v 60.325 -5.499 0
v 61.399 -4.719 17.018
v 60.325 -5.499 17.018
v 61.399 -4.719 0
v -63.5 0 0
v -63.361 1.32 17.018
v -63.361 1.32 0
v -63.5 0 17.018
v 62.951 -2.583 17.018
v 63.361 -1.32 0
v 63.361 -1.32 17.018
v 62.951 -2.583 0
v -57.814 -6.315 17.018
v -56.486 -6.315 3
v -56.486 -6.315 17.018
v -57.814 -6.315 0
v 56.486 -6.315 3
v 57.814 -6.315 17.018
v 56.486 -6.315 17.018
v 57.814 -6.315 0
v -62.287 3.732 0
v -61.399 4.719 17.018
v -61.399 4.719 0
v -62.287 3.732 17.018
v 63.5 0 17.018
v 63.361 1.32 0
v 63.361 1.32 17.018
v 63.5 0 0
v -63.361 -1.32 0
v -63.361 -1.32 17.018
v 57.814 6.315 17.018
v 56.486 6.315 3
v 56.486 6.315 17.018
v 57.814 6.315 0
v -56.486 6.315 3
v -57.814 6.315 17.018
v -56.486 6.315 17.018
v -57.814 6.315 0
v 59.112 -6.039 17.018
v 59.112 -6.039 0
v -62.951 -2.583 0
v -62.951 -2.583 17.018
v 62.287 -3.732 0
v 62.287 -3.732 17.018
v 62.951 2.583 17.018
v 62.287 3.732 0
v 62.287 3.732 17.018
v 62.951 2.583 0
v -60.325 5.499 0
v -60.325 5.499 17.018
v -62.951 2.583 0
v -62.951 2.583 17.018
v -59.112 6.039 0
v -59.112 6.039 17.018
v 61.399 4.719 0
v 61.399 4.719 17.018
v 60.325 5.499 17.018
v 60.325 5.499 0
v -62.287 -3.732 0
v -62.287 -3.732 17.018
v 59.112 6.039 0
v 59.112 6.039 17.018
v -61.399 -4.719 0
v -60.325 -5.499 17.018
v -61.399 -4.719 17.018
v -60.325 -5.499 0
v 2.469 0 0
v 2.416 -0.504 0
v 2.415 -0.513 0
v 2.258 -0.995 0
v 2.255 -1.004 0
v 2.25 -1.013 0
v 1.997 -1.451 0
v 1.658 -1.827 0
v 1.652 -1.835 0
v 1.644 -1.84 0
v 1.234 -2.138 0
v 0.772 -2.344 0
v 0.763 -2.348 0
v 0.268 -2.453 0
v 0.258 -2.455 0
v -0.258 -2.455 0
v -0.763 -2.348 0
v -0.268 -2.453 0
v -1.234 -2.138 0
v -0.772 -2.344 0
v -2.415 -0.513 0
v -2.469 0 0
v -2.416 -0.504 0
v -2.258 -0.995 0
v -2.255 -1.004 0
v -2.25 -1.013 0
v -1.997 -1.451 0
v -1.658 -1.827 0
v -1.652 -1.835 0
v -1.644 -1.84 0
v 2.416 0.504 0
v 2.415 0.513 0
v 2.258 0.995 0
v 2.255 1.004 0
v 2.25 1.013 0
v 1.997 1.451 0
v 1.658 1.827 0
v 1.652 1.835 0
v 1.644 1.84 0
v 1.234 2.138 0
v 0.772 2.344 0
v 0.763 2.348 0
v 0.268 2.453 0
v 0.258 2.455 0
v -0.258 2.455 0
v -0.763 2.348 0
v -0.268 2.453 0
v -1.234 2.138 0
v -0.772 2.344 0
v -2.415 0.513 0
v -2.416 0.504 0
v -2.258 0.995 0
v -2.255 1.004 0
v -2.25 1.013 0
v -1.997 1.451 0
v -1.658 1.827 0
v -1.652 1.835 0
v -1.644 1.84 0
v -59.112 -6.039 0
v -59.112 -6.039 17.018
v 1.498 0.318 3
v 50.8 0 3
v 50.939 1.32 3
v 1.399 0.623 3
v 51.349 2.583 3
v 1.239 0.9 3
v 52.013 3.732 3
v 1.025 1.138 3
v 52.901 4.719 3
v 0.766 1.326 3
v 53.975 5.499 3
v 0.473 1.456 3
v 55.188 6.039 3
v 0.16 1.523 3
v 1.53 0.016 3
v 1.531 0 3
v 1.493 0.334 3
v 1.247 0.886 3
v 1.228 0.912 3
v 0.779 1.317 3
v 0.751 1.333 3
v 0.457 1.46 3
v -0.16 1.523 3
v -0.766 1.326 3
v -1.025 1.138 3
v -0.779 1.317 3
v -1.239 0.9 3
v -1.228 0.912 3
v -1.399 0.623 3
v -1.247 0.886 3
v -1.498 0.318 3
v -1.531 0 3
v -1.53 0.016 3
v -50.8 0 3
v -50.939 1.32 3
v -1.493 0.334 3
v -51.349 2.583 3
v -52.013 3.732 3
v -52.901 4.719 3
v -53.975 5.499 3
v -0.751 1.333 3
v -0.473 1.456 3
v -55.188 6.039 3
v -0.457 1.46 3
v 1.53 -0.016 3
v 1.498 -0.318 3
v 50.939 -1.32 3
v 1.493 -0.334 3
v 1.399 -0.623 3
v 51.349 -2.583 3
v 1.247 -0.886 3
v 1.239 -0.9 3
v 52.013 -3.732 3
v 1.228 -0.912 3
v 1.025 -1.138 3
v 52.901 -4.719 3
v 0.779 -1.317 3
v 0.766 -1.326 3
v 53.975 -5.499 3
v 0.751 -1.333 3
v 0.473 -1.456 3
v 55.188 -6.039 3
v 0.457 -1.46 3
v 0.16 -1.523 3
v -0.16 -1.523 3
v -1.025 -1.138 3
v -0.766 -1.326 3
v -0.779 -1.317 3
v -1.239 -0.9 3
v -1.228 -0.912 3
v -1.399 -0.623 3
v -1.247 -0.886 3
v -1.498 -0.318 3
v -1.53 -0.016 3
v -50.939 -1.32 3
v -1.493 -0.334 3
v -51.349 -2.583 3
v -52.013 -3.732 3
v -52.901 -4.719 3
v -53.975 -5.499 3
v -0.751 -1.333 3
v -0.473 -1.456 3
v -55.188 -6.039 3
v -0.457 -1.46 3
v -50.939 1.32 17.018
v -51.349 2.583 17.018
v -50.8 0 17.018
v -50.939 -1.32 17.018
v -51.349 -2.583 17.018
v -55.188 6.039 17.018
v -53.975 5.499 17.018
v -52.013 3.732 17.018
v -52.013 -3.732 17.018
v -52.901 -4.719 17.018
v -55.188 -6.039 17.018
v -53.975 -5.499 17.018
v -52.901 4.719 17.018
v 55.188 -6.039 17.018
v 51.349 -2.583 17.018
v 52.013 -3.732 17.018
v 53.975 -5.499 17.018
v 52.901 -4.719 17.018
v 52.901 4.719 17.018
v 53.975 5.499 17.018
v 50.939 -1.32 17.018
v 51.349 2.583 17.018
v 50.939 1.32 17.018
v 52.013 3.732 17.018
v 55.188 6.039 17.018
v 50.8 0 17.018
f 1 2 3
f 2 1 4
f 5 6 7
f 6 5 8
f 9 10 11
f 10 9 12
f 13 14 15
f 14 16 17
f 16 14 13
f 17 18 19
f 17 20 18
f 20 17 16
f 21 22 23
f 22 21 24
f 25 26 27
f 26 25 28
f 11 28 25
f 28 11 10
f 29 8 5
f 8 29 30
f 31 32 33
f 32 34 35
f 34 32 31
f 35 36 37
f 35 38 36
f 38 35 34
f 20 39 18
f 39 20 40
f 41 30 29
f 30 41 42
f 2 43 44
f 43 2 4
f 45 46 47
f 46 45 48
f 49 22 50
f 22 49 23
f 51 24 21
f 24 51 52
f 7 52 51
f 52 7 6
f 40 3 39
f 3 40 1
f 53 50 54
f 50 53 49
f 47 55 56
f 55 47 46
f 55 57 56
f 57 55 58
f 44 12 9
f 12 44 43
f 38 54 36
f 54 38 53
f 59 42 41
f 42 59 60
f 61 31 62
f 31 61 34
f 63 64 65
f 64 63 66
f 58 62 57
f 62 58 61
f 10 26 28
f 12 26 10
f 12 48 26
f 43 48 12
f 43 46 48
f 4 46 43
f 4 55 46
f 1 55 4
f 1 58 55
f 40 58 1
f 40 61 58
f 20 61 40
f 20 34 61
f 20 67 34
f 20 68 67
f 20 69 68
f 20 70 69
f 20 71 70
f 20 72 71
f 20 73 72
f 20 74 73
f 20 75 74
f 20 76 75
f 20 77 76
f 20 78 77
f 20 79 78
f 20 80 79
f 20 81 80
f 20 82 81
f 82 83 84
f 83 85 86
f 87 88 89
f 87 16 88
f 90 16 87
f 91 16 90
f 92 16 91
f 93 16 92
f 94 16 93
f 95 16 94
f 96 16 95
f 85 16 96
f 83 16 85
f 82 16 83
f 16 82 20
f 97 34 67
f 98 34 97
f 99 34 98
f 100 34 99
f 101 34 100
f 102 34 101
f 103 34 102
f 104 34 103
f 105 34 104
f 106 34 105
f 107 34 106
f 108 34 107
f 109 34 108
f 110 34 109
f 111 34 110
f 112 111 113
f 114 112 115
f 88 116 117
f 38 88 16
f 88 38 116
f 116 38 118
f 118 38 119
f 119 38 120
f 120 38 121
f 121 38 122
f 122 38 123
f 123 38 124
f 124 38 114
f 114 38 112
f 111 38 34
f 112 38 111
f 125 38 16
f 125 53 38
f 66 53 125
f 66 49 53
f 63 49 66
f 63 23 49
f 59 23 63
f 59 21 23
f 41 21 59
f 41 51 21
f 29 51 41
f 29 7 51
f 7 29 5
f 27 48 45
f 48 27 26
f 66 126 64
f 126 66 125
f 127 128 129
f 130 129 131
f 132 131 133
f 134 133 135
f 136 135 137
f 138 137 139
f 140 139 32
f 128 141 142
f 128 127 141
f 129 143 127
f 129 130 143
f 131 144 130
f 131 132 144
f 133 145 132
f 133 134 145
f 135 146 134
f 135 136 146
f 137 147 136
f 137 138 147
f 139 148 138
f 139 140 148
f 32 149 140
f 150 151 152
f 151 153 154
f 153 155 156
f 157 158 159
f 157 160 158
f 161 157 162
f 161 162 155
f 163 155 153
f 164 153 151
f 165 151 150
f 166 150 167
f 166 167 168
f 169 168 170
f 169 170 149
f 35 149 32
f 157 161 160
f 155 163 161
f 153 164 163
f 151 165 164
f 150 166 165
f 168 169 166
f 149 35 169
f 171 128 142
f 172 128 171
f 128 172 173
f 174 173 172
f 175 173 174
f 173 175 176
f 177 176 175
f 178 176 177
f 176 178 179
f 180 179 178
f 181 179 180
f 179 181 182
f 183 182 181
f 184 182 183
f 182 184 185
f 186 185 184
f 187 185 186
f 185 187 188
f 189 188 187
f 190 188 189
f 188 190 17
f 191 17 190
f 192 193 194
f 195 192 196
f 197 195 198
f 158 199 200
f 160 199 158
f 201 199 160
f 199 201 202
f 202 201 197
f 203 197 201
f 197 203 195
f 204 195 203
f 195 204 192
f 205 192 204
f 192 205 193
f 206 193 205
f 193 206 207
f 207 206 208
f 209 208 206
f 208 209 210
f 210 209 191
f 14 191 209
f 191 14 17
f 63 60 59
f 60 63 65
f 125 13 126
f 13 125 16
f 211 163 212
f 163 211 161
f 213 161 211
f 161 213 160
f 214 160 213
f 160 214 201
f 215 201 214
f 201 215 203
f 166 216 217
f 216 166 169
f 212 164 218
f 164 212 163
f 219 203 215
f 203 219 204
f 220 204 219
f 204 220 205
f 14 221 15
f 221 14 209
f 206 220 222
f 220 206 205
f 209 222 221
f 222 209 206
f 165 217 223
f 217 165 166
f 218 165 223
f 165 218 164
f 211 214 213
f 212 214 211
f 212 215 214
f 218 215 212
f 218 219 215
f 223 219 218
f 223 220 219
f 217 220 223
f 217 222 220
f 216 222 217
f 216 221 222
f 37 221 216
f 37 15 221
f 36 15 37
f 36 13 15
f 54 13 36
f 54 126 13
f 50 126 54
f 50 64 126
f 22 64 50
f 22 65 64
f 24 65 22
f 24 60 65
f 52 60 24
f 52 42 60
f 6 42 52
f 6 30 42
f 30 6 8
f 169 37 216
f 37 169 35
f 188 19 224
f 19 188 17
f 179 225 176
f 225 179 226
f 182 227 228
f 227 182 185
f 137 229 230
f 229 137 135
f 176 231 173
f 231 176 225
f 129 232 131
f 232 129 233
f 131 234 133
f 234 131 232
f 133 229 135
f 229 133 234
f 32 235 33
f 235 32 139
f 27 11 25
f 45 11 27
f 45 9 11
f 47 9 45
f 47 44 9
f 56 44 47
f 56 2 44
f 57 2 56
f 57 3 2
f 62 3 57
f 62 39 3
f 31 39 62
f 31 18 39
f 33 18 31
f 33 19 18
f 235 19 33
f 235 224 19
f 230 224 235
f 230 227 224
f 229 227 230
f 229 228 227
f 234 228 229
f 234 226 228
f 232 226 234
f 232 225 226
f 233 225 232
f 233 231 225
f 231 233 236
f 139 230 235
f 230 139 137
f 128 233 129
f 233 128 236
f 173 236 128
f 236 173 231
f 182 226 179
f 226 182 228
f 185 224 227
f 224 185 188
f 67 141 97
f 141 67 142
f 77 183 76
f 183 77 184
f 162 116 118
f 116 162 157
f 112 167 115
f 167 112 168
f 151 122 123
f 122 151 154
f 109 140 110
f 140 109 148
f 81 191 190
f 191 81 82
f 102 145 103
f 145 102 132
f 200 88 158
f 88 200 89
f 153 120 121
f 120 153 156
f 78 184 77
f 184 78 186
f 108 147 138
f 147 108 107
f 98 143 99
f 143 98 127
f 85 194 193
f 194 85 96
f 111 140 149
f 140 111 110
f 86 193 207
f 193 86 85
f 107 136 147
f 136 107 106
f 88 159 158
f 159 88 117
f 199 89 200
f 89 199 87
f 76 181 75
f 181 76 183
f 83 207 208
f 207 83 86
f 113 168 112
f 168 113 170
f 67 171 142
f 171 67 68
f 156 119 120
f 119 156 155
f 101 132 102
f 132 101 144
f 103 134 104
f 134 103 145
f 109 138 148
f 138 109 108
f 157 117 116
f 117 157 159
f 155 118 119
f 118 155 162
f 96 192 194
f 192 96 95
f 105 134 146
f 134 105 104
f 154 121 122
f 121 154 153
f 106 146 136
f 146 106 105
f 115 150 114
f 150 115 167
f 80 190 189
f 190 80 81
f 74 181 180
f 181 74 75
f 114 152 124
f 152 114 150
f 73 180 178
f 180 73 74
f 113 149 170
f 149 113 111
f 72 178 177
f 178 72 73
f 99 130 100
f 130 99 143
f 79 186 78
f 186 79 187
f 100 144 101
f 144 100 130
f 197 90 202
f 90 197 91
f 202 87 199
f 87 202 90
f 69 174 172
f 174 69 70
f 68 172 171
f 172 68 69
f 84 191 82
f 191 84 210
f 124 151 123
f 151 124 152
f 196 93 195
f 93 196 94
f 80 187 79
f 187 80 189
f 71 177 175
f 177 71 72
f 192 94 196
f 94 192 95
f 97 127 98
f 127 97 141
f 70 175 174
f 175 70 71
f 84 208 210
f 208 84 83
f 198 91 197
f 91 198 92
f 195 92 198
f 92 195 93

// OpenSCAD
// Center Finder
// Adrian McCarthy 2021

module center_finder(width=4*25.4, height=0.67*25.4) {
    $fs=0.2;
    r = 25.4/4;
    spacing = width + 2*r;
    offset = spacing/2;
    difference() {
        union() {
            linear_extrude(3) hull() {
                translate([-offset, 0]) circle(r=r);
                translate([ offset, 0]) circle(r=r);
            }
            translate([-offset, 0, 0]) cylinder(r=r, h=height);
            translate([ offset, 0, 0]) cylinder(r=r, h=height);
        }
        translate([0, 0, -0.1]) cylinder(h=3.2, d1=5, d2=3);
    }
}

center_finder();
